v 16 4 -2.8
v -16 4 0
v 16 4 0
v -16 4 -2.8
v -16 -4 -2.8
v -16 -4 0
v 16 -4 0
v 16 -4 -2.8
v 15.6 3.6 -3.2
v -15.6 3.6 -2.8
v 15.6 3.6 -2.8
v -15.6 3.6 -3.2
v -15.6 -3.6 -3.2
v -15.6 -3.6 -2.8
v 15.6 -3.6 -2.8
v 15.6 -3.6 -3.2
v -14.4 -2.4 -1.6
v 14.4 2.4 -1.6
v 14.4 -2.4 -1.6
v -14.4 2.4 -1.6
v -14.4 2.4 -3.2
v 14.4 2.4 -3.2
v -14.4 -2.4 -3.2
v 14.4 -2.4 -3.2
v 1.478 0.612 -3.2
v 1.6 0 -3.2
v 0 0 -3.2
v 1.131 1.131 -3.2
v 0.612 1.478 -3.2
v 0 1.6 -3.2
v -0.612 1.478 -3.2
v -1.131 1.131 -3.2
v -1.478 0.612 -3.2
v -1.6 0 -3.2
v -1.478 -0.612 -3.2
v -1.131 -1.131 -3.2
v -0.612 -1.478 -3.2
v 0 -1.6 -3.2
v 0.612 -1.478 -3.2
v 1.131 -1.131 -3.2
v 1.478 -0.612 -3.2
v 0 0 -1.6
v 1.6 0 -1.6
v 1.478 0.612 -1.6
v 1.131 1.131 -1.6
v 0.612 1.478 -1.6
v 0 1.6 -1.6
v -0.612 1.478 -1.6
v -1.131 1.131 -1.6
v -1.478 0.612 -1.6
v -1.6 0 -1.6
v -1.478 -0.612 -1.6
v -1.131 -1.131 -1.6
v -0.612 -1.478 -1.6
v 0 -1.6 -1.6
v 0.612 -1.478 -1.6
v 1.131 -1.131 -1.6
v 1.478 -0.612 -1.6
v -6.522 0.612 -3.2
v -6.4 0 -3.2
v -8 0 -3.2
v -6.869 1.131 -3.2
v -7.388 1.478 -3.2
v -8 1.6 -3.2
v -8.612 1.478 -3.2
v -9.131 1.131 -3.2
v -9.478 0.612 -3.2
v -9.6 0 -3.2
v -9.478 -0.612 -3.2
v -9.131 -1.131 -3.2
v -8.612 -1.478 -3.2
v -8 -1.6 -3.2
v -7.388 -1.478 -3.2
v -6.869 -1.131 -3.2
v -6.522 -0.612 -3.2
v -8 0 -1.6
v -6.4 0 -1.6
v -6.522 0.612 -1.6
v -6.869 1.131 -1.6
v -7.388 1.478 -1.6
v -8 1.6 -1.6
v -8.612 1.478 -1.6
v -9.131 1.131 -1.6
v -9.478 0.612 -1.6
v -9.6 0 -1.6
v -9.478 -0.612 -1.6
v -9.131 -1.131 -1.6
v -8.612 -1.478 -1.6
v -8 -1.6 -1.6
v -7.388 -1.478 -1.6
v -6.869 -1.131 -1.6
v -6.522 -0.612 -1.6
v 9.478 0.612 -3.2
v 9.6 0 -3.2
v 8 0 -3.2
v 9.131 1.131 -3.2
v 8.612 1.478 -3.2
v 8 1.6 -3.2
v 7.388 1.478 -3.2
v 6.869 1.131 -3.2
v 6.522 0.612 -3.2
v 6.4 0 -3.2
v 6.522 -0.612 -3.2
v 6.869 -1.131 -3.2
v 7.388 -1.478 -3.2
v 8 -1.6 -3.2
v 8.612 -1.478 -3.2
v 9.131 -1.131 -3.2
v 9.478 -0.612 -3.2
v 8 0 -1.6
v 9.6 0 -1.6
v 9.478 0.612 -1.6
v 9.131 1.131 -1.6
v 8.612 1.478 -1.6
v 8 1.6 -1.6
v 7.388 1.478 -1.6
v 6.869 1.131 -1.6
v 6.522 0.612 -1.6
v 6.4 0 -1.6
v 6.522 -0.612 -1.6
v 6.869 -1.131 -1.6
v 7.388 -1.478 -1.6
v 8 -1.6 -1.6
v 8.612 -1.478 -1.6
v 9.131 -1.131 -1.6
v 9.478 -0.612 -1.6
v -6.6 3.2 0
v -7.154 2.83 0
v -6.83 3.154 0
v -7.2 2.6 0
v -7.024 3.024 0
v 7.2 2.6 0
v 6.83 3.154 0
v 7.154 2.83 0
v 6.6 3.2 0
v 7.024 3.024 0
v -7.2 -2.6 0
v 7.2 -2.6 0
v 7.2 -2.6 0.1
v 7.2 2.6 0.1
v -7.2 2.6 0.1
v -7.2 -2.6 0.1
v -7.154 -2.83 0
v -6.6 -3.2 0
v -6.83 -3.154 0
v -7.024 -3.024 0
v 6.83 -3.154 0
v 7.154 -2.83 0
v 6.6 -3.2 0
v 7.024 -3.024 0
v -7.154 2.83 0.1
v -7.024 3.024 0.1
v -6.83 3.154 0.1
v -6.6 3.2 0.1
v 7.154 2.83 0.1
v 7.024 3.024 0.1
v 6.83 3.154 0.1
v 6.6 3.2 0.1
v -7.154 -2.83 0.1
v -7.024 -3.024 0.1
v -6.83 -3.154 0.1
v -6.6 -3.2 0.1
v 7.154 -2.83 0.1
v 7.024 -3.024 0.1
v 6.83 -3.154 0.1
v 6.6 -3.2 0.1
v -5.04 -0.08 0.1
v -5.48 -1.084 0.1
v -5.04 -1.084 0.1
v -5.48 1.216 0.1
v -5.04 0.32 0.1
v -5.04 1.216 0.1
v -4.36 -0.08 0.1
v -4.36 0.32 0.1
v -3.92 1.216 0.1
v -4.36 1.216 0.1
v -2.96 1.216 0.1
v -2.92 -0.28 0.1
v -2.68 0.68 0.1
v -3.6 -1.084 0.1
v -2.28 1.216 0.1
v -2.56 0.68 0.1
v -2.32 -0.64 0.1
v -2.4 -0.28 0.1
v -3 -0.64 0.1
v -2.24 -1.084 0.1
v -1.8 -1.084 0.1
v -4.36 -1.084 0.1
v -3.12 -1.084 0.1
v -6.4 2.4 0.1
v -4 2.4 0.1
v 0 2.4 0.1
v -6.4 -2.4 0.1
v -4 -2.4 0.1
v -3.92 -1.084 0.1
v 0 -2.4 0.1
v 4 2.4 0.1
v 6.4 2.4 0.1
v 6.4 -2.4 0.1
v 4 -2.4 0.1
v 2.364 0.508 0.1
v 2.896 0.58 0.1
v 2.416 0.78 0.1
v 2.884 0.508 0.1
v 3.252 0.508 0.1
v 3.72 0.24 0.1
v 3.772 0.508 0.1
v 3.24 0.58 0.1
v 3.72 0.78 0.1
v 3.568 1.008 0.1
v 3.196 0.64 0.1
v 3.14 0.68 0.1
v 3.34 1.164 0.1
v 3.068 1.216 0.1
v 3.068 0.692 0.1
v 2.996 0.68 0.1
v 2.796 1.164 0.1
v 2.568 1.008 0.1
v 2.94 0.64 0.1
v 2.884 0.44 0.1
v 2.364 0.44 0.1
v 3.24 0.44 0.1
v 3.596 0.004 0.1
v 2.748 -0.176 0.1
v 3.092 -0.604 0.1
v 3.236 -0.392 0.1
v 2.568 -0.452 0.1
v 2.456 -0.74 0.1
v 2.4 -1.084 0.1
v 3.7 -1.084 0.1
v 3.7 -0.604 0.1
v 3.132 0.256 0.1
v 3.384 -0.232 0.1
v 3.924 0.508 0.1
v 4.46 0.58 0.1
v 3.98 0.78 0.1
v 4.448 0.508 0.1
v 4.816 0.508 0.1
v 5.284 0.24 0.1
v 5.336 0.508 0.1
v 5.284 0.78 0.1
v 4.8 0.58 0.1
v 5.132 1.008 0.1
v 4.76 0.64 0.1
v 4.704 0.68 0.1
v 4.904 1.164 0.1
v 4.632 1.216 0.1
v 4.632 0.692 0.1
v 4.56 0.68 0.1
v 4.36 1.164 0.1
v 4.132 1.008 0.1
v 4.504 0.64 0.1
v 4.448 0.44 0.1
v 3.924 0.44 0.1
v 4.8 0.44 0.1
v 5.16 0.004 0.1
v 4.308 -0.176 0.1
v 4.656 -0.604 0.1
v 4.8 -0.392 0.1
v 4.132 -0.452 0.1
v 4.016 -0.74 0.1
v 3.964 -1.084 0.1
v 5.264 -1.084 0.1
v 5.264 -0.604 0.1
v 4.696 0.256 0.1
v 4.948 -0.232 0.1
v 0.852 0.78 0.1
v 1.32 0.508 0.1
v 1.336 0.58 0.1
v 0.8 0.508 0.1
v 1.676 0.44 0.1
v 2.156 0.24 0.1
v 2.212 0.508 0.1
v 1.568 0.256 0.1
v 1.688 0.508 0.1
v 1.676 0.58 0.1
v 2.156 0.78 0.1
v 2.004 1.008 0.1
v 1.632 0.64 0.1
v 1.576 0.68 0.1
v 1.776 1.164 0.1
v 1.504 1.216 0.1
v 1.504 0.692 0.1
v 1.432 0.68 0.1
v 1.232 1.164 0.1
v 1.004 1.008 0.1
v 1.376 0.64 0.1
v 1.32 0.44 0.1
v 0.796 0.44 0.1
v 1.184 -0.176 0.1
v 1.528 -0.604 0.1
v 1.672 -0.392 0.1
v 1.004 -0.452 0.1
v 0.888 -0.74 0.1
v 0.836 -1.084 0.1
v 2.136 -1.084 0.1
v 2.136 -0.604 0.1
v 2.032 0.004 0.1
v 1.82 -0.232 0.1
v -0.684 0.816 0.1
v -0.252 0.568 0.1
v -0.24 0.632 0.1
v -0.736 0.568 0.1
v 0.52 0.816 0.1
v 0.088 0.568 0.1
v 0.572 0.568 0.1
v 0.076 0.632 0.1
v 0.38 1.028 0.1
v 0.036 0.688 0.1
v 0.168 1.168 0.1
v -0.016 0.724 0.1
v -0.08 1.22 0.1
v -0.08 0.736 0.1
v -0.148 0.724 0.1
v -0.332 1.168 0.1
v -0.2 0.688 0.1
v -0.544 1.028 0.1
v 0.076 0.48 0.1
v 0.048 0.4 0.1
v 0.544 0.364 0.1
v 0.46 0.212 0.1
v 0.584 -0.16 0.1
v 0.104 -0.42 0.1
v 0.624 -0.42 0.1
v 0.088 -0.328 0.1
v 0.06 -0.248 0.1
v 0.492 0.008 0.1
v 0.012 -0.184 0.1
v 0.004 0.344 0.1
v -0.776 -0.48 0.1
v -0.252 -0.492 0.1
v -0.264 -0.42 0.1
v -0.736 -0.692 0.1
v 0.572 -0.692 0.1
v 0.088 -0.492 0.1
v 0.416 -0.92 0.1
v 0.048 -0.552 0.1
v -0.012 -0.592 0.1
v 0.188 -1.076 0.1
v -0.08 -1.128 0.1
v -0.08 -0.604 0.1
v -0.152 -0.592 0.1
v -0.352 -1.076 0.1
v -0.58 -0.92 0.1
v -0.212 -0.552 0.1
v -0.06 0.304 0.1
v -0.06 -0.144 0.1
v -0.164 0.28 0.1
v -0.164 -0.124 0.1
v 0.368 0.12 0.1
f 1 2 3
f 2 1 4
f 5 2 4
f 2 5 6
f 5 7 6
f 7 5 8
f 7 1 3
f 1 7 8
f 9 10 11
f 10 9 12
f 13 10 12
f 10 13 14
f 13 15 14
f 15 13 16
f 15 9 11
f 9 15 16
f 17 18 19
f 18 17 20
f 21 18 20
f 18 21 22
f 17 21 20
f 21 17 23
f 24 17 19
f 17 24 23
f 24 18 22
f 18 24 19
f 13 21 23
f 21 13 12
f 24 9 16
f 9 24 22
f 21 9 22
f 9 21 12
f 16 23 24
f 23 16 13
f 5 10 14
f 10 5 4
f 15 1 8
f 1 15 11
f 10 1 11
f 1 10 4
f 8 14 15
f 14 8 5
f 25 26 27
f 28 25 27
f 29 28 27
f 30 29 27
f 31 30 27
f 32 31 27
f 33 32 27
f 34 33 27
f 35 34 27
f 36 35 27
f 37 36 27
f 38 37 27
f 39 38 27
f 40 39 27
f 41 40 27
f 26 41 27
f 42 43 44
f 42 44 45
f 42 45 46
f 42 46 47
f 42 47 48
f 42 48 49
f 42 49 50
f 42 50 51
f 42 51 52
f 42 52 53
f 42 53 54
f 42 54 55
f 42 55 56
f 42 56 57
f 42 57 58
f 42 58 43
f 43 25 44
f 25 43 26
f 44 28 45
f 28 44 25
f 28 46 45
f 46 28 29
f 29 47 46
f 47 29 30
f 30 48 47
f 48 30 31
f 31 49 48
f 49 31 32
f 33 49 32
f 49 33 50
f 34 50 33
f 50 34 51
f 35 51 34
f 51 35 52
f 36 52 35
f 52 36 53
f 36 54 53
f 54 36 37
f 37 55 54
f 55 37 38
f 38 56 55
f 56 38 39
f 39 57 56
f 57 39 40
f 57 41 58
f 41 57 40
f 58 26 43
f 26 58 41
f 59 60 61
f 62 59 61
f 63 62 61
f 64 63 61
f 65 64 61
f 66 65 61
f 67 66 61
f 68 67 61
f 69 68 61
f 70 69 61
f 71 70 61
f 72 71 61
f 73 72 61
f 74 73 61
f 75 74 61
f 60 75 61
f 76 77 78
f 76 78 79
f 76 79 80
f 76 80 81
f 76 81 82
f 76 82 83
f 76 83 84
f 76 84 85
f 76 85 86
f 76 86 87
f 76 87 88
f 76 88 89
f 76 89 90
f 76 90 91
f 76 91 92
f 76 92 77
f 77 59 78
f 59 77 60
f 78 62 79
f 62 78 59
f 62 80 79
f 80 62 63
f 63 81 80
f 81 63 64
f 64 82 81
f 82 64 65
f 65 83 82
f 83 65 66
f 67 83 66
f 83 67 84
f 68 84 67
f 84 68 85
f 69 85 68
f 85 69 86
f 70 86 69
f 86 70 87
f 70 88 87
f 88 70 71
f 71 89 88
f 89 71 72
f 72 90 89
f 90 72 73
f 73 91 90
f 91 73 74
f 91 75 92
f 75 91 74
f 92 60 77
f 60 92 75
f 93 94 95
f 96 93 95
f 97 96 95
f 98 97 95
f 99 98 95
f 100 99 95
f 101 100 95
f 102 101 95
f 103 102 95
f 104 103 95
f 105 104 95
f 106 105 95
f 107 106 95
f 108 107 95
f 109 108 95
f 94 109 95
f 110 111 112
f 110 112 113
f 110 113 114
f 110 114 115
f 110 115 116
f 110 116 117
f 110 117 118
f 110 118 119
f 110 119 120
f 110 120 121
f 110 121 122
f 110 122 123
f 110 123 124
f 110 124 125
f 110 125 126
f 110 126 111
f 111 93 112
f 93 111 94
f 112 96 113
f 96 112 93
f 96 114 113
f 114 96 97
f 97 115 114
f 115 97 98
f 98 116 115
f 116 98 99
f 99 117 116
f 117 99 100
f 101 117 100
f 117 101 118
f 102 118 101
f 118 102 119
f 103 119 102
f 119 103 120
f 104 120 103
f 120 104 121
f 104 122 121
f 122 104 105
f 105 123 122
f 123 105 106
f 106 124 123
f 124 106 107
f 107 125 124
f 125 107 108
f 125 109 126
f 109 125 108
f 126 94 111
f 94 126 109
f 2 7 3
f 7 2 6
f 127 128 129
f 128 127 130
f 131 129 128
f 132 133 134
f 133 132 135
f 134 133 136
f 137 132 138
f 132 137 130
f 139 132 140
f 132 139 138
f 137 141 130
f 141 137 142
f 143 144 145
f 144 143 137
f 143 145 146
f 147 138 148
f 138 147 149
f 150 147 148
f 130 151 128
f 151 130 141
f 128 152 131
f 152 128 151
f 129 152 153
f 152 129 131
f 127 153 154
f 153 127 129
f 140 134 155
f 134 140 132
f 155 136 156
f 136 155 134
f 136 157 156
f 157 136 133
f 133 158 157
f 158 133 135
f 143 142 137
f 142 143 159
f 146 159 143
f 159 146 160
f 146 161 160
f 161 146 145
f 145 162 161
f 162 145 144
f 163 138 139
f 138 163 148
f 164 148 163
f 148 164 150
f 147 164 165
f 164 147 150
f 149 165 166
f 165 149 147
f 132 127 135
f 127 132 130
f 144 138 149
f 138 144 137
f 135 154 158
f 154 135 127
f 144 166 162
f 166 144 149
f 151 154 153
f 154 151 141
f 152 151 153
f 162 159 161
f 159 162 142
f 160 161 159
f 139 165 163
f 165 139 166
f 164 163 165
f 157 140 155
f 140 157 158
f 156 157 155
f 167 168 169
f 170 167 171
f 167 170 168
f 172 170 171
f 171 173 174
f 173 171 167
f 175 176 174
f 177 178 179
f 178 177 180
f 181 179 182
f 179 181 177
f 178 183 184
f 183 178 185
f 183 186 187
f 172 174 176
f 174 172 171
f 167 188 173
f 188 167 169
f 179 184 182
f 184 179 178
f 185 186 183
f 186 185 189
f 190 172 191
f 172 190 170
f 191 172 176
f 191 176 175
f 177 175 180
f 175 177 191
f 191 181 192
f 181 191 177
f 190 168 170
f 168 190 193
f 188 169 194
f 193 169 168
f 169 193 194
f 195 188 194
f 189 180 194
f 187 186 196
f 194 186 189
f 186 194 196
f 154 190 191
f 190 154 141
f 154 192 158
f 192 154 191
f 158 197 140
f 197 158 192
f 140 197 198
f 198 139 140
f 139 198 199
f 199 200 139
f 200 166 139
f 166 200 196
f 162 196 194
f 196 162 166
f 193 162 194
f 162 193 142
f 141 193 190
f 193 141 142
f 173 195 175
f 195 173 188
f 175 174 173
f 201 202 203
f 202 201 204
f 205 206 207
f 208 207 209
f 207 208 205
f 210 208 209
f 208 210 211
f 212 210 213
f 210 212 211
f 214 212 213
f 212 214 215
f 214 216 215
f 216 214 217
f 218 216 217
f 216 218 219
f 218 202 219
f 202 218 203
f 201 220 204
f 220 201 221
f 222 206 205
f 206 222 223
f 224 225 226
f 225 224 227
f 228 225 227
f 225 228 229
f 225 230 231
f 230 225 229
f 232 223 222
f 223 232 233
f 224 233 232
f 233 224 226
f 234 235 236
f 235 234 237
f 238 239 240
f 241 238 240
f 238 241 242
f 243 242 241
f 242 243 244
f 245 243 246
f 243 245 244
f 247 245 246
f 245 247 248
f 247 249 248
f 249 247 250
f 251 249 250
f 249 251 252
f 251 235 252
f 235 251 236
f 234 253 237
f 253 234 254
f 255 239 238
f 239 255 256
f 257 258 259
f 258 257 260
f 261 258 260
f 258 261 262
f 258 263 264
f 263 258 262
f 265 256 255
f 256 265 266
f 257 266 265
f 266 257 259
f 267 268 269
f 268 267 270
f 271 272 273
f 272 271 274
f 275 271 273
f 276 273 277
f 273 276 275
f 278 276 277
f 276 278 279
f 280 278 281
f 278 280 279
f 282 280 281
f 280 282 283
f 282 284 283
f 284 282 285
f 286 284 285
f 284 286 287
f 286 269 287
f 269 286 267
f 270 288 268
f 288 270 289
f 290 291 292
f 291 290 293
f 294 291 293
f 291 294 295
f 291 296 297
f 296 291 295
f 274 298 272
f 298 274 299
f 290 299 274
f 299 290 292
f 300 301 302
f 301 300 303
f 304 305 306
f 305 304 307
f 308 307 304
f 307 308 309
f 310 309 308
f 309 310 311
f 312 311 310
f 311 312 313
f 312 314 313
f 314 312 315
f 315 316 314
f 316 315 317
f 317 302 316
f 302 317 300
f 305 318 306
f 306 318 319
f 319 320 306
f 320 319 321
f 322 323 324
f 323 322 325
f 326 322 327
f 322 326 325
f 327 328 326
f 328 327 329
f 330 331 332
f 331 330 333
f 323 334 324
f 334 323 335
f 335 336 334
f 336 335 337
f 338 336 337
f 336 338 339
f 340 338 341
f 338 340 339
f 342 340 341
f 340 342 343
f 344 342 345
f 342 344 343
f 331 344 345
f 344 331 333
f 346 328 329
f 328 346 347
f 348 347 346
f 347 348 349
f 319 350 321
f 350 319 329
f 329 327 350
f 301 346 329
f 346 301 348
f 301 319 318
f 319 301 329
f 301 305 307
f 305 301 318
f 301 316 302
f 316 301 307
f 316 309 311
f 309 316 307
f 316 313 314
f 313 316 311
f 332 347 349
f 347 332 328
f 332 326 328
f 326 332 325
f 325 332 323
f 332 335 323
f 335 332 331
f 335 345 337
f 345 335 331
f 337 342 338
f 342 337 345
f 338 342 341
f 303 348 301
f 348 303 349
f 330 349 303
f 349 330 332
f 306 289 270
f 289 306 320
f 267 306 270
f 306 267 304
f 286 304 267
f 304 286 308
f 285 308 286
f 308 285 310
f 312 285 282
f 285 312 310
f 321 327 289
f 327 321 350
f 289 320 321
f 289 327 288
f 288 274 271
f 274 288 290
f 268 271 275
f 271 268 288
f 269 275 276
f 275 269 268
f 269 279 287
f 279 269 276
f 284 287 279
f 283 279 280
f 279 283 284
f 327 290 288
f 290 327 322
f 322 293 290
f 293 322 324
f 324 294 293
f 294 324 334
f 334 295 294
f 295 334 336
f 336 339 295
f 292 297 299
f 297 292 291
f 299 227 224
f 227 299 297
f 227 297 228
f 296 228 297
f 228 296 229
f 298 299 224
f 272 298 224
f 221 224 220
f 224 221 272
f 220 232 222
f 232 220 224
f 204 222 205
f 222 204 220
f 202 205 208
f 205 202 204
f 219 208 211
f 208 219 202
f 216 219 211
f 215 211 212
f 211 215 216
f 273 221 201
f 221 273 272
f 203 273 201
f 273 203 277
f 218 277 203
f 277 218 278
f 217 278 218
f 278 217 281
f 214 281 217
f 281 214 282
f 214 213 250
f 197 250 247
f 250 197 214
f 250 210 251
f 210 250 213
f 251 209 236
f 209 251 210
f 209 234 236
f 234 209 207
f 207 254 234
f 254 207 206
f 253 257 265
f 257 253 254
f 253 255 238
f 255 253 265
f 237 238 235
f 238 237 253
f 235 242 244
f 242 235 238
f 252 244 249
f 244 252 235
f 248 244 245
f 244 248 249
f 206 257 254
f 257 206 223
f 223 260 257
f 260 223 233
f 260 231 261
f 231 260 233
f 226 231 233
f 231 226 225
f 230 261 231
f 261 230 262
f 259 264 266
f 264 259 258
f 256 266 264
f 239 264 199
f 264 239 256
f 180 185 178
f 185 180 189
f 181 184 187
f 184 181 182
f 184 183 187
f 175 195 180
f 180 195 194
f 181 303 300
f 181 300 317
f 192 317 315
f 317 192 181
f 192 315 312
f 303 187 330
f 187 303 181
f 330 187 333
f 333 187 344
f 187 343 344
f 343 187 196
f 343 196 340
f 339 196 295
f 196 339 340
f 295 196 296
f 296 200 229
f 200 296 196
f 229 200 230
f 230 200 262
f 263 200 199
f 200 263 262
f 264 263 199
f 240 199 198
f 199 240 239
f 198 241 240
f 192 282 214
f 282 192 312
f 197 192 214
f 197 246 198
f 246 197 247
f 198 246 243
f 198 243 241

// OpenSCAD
use <../lib.scad>
use <2431.scad>
use <4578235b.scad>
function ldraw_lib__2431d0j() = [
// 0 Tile  1 x  4 with Black "HA 3222" on White Background and Black Border Sticker
// 0 Name: 2431d0j.dat
// 0 Author: Evert-Jan Boer [ejboer]
// 0 !LDRAW_ORG Shortcut UPDATE 2026-07
// 0 !LICENSE Licensed under CC BY 4.0 : see CAreadme.txt
// 
// 0 BFC CERTIFY CCW
  [0,"BFC","CERTIFY"],
  [0,"BFC","CCW"],
// 
// 0 !CATEGORY Sticker Shortcut
// 0 !KEYWORDS Bricklink 2431pb144, Set 3222
// 
// 0 !HISTORY 2026-07-30 [OrionP] Official Update 2026-07
// 
// 1 16 0 0 0 1 0 0 0 1 0 0 0 1 2431.dat
  [1,16,0,0,0,1,0,0,0,1,0,0,0,1, ldraw_lib__2431()],
// 1 16 0 0 0 1 0 0 0 1 0 0 0 1 4578235b.dat
  [1,16,0,0,0,1,0,0,0,1,0,0,0,1, ldraw_lib__4578235b()],
];
module ldraw_lib__2431d0j(step=0, col=false, unit=2/5, alt=false, line=0.2, solid=!$preview)
    makepoly(ldraw_lib__2431d0j(), step=step, col=col, unit=unit, alt=alt, line=line, solid=solid);
ldraw_lib__2431d0j(line=0.2);
